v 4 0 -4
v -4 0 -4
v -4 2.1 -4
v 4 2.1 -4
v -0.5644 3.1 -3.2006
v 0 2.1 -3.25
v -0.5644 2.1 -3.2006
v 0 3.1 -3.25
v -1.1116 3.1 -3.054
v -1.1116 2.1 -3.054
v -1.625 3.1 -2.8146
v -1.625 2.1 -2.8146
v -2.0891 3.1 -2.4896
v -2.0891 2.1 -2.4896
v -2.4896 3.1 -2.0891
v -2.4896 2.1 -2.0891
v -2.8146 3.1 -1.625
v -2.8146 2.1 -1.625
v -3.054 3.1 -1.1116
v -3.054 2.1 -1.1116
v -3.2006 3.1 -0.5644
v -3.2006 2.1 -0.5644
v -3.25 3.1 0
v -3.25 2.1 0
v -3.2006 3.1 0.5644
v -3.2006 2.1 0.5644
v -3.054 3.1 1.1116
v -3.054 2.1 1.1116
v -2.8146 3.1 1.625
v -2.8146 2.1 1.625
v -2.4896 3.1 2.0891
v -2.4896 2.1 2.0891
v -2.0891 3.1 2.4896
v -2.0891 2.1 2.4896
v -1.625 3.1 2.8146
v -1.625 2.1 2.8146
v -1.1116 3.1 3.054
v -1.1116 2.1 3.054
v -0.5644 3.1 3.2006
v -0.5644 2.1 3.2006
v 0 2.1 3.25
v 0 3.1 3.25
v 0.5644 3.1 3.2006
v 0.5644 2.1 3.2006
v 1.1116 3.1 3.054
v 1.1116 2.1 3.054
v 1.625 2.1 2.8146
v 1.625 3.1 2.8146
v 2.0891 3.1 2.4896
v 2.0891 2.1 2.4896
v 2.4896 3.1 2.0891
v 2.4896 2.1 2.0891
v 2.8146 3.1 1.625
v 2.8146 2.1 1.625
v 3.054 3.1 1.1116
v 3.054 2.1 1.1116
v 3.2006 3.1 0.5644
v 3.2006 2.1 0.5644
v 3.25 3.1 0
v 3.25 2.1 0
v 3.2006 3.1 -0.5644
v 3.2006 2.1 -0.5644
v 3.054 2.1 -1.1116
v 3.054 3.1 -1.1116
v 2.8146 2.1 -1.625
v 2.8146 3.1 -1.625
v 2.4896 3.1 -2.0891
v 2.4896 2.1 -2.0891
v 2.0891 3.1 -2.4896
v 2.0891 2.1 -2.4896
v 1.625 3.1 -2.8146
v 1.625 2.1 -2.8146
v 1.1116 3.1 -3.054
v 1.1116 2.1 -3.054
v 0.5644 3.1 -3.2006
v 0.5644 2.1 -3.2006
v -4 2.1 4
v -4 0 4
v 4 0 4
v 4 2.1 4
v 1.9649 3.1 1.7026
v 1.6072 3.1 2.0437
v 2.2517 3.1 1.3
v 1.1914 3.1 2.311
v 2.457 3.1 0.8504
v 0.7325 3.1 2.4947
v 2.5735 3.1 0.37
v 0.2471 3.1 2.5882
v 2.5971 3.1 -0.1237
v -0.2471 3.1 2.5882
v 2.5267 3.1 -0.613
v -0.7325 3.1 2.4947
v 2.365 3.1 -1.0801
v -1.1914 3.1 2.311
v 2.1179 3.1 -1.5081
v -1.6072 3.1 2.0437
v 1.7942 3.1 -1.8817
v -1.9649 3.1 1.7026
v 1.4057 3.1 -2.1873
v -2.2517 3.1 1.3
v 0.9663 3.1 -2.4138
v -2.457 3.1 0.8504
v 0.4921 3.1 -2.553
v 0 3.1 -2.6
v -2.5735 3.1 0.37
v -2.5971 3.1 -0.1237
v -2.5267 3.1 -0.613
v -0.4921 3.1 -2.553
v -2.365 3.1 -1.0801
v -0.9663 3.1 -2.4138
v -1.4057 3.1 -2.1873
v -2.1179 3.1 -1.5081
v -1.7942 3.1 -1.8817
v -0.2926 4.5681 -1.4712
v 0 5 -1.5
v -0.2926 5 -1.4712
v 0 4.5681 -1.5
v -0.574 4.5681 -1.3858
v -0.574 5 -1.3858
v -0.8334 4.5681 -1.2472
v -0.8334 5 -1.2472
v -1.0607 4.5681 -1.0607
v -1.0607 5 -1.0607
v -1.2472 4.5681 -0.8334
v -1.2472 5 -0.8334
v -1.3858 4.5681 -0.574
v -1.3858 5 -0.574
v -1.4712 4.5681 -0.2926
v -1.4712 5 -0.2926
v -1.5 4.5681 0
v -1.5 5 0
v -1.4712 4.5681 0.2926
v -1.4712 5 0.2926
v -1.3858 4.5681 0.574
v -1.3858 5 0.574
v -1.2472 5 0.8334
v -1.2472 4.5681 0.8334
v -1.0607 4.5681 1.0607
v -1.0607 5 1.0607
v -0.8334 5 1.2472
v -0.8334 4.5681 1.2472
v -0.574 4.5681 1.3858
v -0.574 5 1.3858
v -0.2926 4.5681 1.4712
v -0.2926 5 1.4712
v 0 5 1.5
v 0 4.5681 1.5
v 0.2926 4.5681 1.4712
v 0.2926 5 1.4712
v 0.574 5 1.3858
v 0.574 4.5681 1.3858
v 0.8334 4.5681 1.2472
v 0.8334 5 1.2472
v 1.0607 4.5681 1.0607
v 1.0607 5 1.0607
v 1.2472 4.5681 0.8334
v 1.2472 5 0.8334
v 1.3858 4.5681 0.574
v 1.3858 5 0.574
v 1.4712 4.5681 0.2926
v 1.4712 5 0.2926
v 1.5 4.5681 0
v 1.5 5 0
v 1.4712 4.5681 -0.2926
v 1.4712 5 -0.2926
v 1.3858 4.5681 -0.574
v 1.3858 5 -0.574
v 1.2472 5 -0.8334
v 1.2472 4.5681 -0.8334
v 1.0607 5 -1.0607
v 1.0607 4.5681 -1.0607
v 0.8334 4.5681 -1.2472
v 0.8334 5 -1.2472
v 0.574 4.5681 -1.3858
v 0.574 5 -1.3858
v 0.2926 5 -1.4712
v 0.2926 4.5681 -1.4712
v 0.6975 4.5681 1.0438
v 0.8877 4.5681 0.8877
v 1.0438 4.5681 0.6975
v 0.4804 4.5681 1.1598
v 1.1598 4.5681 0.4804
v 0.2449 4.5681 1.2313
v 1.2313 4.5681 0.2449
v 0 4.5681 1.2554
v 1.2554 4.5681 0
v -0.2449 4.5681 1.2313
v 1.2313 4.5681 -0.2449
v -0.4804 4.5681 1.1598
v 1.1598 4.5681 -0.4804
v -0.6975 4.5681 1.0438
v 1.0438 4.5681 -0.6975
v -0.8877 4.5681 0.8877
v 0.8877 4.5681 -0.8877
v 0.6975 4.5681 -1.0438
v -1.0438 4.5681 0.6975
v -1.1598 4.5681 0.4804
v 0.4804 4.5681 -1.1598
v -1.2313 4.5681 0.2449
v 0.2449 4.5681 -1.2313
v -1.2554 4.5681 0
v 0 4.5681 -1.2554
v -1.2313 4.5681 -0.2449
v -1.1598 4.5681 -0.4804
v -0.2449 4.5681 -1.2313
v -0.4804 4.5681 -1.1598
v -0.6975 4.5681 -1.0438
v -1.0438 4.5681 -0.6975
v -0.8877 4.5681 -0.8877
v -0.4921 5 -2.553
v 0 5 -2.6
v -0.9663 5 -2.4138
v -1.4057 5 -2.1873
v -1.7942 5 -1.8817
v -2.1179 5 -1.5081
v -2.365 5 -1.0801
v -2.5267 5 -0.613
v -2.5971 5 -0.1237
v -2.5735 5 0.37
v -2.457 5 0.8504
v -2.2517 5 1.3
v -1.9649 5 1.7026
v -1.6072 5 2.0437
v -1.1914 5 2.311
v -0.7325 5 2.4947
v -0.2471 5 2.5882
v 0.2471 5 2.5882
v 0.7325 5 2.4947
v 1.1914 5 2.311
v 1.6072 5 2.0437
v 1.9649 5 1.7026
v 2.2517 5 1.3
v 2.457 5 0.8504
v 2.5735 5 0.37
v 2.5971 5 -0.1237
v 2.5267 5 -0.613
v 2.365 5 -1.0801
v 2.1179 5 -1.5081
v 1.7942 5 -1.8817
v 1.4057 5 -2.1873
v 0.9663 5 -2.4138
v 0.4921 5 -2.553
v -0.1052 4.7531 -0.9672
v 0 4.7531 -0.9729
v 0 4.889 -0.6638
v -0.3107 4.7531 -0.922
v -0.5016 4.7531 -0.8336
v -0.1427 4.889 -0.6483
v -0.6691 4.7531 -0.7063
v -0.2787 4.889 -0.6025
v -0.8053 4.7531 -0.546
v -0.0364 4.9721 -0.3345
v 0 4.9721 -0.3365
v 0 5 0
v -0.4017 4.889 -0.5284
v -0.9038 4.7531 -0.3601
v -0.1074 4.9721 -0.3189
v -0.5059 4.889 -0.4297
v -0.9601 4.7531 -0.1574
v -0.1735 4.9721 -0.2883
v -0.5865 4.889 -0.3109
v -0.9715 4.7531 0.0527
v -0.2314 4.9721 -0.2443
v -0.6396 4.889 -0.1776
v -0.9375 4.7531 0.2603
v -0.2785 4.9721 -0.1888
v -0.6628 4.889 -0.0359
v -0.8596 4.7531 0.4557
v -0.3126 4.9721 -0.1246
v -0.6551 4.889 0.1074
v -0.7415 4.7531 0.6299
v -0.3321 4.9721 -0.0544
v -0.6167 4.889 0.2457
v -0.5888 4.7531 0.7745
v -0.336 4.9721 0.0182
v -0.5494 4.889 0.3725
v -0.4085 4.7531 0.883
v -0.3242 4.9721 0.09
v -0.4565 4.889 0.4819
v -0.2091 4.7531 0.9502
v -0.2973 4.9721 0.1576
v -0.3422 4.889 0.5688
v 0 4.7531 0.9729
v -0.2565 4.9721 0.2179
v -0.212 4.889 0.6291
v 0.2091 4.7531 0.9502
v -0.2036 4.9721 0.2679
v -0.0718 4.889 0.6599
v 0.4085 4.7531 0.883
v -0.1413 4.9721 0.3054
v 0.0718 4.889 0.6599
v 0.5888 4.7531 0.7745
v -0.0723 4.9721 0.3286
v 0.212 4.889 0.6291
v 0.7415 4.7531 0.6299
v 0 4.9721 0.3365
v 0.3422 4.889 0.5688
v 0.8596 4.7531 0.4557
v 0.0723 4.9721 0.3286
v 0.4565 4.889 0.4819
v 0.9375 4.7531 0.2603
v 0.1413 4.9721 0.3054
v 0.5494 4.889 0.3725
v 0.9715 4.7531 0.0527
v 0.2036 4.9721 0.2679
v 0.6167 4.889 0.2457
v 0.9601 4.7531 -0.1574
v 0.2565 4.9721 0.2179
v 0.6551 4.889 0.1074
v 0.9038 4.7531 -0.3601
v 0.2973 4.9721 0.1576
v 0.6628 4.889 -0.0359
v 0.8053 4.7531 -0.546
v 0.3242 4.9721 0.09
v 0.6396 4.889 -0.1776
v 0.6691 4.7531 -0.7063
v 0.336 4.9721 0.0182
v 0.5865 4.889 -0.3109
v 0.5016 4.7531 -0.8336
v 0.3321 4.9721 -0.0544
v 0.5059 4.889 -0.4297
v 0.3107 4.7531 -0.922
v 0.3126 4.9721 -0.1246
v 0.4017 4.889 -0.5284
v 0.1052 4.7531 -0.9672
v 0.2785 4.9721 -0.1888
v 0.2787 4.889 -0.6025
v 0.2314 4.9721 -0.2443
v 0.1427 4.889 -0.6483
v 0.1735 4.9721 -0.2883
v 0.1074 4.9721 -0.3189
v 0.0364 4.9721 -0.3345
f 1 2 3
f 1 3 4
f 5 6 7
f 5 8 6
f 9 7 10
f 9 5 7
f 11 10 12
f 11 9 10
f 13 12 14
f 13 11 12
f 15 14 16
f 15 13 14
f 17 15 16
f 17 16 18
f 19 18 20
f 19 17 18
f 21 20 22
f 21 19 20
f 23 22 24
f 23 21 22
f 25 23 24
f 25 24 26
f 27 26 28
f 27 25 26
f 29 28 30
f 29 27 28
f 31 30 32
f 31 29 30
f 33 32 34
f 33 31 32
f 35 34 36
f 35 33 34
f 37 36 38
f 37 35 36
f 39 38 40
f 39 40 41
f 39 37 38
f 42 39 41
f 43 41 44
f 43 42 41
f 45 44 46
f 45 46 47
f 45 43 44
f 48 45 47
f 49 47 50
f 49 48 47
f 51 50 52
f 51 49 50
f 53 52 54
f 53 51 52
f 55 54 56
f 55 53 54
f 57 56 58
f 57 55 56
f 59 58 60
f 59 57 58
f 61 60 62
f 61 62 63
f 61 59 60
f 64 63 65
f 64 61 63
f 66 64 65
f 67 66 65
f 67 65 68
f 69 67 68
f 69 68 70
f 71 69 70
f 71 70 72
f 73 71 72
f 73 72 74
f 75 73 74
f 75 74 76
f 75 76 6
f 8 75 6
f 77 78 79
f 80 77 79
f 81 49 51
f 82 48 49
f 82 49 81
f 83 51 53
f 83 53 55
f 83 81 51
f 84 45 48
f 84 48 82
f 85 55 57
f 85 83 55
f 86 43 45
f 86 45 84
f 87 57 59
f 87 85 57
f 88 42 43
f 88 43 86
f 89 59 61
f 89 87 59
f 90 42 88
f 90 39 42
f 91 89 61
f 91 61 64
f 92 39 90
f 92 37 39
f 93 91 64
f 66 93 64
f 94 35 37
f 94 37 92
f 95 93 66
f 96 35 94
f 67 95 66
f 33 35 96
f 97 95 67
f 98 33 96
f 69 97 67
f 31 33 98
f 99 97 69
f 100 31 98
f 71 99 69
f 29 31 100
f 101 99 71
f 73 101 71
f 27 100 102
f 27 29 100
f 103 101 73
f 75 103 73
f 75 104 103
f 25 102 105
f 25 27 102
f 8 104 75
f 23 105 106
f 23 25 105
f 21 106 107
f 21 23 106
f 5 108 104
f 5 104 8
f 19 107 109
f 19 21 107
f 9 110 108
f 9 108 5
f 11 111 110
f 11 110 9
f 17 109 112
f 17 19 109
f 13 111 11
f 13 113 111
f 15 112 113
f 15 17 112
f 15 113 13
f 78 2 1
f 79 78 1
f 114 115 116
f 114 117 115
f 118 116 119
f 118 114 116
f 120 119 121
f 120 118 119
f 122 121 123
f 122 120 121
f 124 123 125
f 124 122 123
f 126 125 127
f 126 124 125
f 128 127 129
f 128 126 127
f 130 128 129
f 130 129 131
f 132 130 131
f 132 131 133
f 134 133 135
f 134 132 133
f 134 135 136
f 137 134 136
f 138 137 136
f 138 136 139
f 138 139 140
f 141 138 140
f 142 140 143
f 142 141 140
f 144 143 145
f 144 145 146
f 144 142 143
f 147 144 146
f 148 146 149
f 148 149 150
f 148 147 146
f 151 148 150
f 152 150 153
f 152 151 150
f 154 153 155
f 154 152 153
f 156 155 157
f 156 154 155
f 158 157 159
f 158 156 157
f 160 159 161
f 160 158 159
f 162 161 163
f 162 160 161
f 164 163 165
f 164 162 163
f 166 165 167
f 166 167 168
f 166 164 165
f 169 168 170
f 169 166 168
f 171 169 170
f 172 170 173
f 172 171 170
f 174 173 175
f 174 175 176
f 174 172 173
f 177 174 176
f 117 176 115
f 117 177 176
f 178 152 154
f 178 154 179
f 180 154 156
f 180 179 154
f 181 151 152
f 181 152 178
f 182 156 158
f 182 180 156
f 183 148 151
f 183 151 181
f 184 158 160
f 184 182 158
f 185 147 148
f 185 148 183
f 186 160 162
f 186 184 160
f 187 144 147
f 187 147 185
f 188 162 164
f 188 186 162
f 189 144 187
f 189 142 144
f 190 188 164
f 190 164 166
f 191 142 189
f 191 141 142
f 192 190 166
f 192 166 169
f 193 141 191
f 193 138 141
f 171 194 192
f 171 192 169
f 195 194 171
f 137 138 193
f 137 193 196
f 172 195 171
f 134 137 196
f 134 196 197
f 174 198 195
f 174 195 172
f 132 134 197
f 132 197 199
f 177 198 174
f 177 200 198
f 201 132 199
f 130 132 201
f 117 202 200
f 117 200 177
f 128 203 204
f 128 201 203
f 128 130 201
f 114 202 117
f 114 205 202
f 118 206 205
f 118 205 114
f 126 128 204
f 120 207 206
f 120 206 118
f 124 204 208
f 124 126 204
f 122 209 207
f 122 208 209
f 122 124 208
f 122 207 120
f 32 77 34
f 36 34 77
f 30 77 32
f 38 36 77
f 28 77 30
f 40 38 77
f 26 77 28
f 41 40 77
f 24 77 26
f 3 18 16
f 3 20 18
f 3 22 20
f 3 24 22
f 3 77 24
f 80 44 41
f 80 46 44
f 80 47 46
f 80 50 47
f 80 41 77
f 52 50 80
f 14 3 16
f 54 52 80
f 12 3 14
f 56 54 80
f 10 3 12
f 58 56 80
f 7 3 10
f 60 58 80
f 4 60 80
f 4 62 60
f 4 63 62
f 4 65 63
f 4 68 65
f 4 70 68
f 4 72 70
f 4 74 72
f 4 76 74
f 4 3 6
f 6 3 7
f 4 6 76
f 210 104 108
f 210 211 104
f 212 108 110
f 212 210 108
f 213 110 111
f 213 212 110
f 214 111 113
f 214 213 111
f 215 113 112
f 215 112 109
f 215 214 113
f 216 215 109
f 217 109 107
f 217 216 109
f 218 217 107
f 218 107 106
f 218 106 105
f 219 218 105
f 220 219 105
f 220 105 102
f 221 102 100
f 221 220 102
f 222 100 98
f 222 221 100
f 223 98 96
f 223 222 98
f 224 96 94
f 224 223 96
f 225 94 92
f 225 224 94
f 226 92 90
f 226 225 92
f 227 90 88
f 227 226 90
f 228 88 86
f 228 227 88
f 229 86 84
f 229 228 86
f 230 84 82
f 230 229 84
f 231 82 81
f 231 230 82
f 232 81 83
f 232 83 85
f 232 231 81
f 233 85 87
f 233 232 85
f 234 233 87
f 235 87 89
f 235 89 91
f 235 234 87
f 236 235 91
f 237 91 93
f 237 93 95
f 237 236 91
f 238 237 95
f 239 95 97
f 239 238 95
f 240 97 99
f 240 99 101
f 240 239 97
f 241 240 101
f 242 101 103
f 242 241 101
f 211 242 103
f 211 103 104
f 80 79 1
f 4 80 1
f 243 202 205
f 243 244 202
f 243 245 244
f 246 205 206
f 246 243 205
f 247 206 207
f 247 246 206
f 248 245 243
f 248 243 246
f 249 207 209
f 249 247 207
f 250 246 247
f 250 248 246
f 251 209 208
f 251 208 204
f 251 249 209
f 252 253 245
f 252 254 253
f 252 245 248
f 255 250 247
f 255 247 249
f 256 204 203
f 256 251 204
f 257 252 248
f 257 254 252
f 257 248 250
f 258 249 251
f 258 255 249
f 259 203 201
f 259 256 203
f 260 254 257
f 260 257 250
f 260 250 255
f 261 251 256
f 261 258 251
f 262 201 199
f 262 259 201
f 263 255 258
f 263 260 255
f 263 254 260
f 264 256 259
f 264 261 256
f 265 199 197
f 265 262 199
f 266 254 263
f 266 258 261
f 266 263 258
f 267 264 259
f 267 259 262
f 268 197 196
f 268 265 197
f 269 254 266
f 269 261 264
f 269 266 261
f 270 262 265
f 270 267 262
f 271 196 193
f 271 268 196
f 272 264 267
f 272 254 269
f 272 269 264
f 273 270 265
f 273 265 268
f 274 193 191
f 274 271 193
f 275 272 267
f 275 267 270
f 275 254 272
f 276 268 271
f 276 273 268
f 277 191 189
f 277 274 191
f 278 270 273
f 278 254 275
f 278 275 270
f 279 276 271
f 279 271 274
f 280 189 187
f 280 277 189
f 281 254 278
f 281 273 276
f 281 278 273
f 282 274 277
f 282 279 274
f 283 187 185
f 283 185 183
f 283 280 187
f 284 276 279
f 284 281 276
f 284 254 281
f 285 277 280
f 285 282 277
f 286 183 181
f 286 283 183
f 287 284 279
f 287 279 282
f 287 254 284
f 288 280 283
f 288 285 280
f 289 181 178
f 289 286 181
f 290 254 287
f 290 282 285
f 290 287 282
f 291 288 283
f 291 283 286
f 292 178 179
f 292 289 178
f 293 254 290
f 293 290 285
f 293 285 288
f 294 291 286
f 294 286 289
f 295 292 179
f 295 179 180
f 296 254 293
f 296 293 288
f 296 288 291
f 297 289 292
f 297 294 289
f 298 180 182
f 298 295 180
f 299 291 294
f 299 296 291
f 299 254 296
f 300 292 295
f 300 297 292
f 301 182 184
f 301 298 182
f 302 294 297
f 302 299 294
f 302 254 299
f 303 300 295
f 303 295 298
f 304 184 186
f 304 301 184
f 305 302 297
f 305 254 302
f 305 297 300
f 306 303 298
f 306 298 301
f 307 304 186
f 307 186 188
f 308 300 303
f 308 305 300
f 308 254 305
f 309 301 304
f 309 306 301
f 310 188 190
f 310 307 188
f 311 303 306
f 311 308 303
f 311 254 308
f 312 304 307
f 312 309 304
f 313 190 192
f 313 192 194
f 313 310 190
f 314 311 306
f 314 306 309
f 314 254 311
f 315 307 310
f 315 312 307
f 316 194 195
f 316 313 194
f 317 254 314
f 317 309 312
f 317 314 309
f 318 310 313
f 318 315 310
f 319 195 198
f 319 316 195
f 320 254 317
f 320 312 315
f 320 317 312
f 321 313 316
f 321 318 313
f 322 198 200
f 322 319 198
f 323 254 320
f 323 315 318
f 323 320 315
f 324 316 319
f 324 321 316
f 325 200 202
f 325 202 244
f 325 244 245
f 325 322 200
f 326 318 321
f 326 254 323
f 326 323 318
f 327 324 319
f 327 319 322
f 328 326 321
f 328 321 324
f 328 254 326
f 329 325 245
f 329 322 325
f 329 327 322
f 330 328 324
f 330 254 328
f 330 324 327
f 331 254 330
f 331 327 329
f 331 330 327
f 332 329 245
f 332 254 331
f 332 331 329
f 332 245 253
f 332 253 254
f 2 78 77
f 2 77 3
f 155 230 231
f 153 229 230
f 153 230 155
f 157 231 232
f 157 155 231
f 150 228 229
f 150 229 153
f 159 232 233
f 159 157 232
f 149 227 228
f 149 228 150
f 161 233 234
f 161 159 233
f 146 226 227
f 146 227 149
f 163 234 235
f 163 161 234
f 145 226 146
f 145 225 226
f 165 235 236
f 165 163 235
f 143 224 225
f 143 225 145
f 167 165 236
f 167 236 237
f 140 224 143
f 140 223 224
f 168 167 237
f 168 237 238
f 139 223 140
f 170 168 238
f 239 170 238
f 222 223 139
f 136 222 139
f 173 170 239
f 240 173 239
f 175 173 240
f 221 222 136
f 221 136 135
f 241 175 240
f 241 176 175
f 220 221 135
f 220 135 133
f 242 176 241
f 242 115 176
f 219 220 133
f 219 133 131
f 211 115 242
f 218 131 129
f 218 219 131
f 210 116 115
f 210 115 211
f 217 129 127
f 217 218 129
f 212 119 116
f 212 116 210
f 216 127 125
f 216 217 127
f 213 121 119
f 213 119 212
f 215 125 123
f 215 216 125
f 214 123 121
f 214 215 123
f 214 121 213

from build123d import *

# Parameters (mm, degrees)
SKETCH1_W           = 8
SKETCH1_H           = 8
BOSS_EXTRUDE1_DEPTH = 2.1


with BuildPart() as part:
    # Sketch1 → Boss-Extrude1 (new body)
    with BuildSketch(Plane(origin=(0, 0, 0), x_dir=(1, 0, 0), z_dir=(0, 1, 0))):
        Rectangle(SKETCH1_W, SKETCH1_H)
    extrude(amount=BOSS_EXTRUDE1_DEPTH)

    # Sketch2 → Revolve1 (revolve)
    with BuildSketch(Plane(origin=(0, 0, 0), x_dir=(0, 0, -1), z_dir=(1, 0, 0)), mode=Mode.PRIVATE) as revolve1_sk:
        with BuildLine():
            Line((-3.25, 2.1), (-3.25, 3.1))
            Line((-3.25, 3.1), (-2.6, 3.1))
            Line((-2.6, 3.1), (-2.6, 5))
            Line((-2.6, 5), (-1.5, 5))
            Line((-1.5, 5), (-1.5, 4.568074784))
            Line((-1.5, 4.568074784), (-1.255377615, 4.568074784))
            ThreePointArc((-1.255377615, 4.568074784), (-0.663801994, 4.888999279), (0, 5))
            Line((0, 5), (0, 2.1))
            Line((0, 2.1), (-3.25, 2.1))
        make_face()
    revolve(revolve1_sk.sketch.rotate(Axis((0, 0, 0), (0, 1, 0)), 180), axis=Axis((0, 0, 0), (0, 1, 0)))


solid = part.part
